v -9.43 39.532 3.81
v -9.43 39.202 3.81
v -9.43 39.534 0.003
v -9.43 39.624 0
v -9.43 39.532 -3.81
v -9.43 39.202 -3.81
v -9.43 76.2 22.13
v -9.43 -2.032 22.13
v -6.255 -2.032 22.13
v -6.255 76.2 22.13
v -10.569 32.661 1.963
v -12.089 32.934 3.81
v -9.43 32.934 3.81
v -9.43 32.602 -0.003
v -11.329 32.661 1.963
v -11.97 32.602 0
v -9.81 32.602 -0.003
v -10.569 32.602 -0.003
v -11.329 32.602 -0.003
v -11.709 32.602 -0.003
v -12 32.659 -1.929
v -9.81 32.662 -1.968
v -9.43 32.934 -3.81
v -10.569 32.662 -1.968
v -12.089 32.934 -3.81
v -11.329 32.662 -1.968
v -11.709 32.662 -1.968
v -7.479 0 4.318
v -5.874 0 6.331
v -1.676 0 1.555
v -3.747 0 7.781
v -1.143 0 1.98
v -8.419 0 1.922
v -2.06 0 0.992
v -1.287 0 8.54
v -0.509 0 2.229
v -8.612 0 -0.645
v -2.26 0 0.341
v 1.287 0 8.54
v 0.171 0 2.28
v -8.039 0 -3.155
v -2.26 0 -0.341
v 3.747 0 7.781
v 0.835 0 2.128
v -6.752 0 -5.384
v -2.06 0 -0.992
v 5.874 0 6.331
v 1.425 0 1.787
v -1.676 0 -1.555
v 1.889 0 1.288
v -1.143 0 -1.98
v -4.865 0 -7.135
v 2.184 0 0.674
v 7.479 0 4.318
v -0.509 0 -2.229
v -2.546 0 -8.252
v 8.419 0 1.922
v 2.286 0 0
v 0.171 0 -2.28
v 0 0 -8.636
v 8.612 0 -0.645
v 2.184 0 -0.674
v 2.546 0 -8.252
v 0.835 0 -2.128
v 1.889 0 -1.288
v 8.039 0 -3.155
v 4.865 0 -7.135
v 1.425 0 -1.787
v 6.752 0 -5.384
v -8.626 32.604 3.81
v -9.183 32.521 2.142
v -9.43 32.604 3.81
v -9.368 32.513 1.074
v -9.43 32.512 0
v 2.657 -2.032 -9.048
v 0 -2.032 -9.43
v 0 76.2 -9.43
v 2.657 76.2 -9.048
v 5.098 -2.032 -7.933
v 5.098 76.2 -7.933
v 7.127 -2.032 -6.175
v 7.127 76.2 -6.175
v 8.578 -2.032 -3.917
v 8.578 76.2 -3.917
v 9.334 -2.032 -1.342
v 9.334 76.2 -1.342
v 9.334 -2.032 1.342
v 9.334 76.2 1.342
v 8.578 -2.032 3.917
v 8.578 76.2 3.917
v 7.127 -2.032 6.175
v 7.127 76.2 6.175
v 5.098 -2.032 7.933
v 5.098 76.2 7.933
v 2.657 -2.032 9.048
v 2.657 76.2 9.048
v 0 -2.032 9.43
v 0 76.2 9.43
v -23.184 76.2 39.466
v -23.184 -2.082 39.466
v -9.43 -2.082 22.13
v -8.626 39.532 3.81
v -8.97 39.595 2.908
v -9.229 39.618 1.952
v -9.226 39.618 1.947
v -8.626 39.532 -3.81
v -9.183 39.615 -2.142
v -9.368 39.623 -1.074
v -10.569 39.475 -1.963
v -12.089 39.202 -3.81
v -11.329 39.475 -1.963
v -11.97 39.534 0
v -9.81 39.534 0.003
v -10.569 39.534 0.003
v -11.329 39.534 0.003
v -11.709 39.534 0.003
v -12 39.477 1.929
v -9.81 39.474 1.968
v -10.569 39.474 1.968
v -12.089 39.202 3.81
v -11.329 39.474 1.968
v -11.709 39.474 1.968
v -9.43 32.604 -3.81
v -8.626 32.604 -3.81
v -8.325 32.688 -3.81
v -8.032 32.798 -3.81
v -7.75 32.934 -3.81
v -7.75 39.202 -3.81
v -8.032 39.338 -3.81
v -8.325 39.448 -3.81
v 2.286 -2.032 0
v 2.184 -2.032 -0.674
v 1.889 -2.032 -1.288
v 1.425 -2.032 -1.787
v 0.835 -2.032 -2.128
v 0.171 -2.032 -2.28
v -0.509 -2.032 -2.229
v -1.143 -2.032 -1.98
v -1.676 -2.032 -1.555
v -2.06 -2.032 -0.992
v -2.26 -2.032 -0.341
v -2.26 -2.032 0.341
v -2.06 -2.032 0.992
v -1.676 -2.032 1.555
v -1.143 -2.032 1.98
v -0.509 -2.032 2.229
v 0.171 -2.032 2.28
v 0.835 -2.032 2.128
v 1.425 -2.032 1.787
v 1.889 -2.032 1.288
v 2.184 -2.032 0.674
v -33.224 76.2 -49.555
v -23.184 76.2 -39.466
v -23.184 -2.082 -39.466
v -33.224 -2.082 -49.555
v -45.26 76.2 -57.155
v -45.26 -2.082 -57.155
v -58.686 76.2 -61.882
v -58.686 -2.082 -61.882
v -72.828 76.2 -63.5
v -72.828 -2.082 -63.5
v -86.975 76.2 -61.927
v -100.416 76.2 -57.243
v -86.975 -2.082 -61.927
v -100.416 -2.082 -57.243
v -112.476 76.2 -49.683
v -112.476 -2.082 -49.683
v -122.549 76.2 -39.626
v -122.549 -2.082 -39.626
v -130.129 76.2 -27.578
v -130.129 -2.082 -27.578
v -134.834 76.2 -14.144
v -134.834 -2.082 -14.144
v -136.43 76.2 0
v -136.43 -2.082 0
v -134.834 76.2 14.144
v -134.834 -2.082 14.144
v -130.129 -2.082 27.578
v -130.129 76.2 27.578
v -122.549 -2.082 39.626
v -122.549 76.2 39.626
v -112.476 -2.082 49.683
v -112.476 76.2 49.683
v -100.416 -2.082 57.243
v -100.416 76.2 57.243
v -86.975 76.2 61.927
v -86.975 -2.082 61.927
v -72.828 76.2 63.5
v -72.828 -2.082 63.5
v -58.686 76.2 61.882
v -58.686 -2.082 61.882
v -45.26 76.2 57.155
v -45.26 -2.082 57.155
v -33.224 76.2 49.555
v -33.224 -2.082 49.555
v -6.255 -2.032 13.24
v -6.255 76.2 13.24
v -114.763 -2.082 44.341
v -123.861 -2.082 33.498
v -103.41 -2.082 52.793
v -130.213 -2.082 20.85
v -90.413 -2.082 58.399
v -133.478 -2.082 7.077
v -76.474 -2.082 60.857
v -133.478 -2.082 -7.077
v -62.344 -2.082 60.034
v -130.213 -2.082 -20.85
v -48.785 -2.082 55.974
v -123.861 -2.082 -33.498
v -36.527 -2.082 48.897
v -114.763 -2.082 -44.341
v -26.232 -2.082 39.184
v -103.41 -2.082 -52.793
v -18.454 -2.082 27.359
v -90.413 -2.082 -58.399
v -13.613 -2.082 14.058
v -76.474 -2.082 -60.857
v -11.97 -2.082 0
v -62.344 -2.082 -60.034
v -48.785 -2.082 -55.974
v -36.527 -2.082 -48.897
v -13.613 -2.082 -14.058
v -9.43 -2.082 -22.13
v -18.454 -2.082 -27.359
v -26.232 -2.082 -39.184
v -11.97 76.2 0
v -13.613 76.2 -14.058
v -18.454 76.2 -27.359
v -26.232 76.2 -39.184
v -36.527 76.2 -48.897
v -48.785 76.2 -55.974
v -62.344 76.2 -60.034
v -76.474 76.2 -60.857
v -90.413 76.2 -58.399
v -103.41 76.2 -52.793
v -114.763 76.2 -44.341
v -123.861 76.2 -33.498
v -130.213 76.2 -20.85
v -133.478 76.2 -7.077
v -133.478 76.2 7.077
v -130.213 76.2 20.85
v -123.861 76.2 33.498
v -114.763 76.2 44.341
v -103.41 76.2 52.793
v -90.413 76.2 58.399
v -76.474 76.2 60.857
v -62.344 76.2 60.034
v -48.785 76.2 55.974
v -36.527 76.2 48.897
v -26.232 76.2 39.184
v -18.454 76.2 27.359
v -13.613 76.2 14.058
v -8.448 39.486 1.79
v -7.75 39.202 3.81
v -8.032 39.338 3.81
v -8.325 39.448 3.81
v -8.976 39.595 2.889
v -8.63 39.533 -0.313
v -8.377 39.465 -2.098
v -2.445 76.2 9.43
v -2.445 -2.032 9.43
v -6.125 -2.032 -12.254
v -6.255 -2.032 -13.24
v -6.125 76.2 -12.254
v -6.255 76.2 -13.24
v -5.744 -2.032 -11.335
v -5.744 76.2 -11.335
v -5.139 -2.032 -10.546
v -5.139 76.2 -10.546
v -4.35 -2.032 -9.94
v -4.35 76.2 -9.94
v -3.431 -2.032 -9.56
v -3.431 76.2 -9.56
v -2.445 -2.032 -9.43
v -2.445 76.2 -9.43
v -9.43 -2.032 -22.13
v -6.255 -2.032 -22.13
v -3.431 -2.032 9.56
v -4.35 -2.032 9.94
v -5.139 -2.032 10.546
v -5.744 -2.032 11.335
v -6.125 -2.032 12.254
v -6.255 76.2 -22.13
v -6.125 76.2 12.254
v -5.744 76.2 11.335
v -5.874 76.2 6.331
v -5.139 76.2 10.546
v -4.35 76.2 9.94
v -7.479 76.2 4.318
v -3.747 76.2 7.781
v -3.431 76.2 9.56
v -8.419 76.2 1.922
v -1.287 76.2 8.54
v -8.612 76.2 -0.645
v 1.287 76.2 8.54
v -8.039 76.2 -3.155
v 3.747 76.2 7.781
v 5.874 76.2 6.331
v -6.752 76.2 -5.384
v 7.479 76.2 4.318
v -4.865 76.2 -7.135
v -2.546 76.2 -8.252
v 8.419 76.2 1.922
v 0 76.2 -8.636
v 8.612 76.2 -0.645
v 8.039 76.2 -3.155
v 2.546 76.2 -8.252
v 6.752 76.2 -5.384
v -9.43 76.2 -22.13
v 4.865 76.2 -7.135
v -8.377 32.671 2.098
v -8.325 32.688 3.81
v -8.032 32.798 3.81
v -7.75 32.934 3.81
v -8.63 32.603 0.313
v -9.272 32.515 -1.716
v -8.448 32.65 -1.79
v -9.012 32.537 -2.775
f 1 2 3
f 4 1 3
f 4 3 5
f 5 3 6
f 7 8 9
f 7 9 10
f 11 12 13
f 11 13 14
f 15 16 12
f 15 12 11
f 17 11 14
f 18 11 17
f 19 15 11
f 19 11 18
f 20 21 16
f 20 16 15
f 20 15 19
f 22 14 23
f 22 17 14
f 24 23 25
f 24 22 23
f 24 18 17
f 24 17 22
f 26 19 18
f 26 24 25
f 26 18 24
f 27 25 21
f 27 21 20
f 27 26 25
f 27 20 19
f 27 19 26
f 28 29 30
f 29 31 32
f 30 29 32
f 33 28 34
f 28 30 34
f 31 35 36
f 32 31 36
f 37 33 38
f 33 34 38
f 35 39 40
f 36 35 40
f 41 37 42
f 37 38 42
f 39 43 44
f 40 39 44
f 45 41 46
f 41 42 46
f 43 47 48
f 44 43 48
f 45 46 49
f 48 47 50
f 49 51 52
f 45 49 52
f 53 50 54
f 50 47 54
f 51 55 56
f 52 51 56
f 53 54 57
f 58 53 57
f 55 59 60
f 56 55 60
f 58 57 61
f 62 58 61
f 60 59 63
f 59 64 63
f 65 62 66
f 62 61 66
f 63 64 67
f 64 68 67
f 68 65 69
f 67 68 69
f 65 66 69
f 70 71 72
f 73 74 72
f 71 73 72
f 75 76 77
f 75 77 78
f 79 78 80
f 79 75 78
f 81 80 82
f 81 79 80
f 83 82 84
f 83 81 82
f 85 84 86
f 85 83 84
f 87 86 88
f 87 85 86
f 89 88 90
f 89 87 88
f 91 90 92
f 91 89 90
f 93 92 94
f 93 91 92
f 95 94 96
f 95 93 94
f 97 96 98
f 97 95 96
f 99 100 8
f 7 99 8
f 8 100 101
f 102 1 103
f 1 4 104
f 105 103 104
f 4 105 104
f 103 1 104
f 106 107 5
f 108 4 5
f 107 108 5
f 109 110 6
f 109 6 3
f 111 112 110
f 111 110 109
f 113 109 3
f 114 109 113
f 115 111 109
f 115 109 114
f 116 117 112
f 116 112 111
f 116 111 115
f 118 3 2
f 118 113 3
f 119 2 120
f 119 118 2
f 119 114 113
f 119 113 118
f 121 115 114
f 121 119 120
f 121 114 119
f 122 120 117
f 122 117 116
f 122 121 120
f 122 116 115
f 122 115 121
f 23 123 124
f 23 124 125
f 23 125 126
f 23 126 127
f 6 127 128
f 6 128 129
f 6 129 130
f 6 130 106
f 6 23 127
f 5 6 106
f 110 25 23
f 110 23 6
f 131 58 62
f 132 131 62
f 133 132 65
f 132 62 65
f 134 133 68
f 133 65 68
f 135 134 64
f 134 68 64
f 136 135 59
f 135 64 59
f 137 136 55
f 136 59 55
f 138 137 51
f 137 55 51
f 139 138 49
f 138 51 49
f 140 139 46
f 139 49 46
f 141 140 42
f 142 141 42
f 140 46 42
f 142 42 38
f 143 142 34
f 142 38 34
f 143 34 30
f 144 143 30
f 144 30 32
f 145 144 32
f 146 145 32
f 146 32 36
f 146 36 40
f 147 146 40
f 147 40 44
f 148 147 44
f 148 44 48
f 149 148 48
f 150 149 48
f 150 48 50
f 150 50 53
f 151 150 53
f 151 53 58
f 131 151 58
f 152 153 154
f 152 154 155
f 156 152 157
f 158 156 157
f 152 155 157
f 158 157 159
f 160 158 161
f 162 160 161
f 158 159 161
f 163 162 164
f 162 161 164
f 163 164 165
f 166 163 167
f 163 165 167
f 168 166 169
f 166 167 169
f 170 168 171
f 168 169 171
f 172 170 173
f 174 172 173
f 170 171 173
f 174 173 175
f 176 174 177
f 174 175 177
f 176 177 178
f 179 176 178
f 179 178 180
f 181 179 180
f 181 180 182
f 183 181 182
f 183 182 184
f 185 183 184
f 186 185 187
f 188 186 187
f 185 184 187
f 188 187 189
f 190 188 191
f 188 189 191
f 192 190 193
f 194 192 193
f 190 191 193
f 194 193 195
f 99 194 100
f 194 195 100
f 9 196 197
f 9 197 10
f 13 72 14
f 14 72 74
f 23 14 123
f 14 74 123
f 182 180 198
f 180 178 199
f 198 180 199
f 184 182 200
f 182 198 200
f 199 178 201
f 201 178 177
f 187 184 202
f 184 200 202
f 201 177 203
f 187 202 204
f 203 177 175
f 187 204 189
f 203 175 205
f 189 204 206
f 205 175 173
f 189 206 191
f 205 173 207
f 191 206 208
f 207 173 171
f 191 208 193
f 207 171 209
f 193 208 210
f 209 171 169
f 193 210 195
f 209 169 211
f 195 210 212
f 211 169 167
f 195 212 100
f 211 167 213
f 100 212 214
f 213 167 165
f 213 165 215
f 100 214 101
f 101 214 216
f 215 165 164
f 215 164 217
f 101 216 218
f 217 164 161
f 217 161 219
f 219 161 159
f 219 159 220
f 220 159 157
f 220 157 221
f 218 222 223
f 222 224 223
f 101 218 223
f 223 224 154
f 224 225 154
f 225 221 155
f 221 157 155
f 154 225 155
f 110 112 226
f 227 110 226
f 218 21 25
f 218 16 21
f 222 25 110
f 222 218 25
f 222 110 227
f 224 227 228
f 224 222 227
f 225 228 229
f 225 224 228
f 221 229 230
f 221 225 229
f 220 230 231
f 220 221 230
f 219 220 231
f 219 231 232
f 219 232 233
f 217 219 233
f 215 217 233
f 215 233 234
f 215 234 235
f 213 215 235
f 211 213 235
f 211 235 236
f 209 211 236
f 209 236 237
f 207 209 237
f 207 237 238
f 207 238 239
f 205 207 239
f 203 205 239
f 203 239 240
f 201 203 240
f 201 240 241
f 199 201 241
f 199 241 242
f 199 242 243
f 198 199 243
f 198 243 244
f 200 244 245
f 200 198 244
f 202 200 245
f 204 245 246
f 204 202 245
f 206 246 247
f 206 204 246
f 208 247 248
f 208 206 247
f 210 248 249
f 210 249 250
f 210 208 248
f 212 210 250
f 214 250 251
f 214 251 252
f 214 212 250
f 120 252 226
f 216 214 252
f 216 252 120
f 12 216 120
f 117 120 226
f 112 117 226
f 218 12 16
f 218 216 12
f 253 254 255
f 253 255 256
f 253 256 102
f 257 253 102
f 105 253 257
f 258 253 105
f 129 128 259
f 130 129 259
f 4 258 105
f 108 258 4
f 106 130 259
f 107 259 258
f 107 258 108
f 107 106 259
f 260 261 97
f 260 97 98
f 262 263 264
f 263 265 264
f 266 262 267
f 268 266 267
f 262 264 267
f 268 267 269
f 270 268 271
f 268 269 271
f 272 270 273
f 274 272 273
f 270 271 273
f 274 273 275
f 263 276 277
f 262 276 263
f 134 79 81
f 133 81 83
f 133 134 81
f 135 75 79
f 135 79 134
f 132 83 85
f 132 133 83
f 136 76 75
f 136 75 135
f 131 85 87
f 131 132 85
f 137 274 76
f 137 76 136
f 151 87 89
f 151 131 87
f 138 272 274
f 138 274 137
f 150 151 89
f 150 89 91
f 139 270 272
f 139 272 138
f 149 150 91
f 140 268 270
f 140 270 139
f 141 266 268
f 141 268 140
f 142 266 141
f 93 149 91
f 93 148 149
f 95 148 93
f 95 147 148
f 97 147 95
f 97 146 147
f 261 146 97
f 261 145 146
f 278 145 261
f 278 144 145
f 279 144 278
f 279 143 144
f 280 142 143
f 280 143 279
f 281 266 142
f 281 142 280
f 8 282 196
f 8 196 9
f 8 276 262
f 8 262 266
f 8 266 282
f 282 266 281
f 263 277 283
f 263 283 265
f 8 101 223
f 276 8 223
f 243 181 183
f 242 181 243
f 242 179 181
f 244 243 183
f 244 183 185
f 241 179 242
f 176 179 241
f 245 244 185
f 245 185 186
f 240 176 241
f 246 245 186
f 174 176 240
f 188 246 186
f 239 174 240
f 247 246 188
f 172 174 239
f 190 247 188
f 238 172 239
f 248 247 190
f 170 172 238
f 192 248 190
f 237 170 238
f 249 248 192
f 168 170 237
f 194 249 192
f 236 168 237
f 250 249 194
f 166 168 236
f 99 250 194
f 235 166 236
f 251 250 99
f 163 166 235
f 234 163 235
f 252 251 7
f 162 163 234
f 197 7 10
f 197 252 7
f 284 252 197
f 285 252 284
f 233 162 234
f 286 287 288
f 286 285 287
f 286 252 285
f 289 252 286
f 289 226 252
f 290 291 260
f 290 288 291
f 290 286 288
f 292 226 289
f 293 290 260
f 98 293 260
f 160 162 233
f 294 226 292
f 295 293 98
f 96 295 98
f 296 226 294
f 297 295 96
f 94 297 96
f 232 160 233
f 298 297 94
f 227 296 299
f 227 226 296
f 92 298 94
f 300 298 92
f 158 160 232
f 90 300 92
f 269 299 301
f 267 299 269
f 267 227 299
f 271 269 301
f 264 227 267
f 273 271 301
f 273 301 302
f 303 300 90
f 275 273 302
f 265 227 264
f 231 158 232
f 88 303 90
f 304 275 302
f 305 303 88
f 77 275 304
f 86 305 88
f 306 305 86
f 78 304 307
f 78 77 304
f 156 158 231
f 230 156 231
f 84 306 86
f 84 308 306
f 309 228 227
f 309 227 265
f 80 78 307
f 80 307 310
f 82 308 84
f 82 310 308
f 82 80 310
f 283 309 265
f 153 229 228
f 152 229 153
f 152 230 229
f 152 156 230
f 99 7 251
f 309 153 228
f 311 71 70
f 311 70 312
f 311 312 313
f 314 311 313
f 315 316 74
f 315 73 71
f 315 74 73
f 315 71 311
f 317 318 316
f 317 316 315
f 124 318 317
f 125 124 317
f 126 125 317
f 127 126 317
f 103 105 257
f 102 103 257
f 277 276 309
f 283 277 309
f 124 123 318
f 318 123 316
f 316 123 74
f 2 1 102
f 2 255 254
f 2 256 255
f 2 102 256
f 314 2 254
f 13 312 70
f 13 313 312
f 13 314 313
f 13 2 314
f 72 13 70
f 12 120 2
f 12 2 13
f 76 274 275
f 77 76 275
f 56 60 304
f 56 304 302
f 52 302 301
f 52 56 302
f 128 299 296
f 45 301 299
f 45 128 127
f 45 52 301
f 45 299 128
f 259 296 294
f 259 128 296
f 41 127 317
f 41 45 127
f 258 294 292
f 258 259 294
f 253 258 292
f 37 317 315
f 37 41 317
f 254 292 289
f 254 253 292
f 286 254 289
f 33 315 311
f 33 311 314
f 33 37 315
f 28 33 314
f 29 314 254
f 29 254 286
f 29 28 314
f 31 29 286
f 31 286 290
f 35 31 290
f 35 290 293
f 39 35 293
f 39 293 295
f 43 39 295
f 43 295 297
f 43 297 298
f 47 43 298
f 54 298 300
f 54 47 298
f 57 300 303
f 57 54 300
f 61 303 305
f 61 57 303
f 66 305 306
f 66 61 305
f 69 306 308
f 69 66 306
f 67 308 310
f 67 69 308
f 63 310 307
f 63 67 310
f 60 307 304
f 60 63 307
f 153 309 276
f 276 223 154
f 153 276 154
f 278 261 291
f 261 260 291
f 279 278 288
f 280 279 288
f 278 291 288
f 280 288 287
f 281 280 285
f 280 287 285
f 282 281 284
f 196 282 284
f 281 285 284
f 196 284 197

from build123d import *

# Parameters (mm, degrees)
SKETCH1_R                        = 9.42975
SKETCH1_R_2                      = 8.636
BOSS_EXTRUDE1_DEPTH              = 76.2
BOSS_EXTRUDE2_START              = 2.032
SKETCH2_R                        = 9.42975
BOSS_EXTRUDE2_DEPTH              = 2.032
F_10_0_1935_DIAMETER_HOLE1_D     = 4.572
F_10_0_1935_DIAMETER_HOLE1_DEPTH = 6.35
F_10_0_1935_DIAMETER_HOLE1_TIP   = 1.373567375
CUT_EXTRUDE1_DEPTH               = 3.81
CUT_EXTRUDE1_DEPTH_BACK          = 3.81
BOSS_EXTRUDE7_REACH              = 81.064
SKETCH7_W                        = 18.8595
SKETCH7_H                        = 78.232
SKETCH7_10_W                     = 12.7
SKETCH7_10_H                     = 78.232
BOSS_EXTRUDE8_DEPTH              = 3.175
FILLET1_R                        = 3.81
BOSS_EXTRUDE9_START              = -78.282
BOSS_EXTRUDE9_OUTLINE_R          = 60.96
BOSS_EXTRUDE9_DEPTH              = 78.282
CUT_EXTRUDE5_START               = -12.0889291
CUT_EXTRUDE5_DEPTH               = 2.6591791


# Read off the part's stored shape, not the designer's step: Boss-Extrude9, Cut-Extrude5
with BuildPart() as part:
    # Sketch1 → Boss-Extrude1 (new body)
    with BuildSketch(Plane(origin=(0, 0, 0), x_dir=(1, 0, 0), z_dir=(0, 1, 0))):
        with Locations(Location((0, 0, 0), (0, 0, 90))):
            Circle(SKETCH1_R)
        with Locations(Location((0, 0, 0), (0, 0, 90))):
            Circle(SKETCH1_R_2, mode=Mode.SUBTRACT)
    extrude(amount=BOSS_EXTRUDE1_DEPTH)

    # Sketch2 → Boss-Extrude2 (add)
    with BuildSketch(Plane.XZ.offset(BOSS_EXTRUDE2_START)):
        with Locations(Location((0, 0, 0), (0, 0, 270))):
            Circle(SKETCH2_R)
    extrude(amount=-BOSS_EXTRUDE2_DEPTH)

    # #10 (0.1935) Diameter Hole1
    with Locations(Plane(origin=(0, -2.032, 0), x_dir=(-1, 0, 0), z_dir=(0, -1, 0))):
        with Locations((0, 0)):
            Hole(F_10_0_1935_DIAMETER_HOLE1_D / 2, depth=F_10_0_1935_DIAMETER_HOLE1_DEPTH)
            with Locations((0, 0, -(F_10_0_1935_DIAMETER_HOLE1_DEPTH + F_10_0_1935_DIAMETER_HOLE1_TIP / 2))):  # 118° drill point
                Cone(0, F_10_0_1935_DIAMETER_HOLE1_D / 2, F_10_0_1935_DIAMETER_HOLE1_TIP, mode=Mode.SUBTRACT)

    # Sketch6 → Cut-Extrude1 (cut, two sides: drawn at the far end of the back side and taken through both)
    with BuildSketch(Plane.XY.offset(-CUT_EXTRUDE1_DEPTH_BACK)):
        with BuildLine():
            ThreePointArc((-9.42975, 32.512), (-5.87375, 36.068), (-9.42975, 39.624))
            Line((-9.42975, 39.624), (-9.42975, 32.512))
        make_face()
    extrude(amount=CUT_EXTRUDE1_DEPTH + CUT_EXTRUDE1_DEPTH_BACK, mode=Mode.SUBTRACT)

    # Sketch7 → Boss-Extrude7 (add, up to next)
    with BuildSketch(Plane.ZY.offset(9.42975), mode=Mode.PRIVATE) as boss_extrude7_sk1:
        with Locations((0, 37.084)):
            Rectangle(SKETCH7_W, SKETCH7_H)
        with BuildLine():
            add(Edge.make_bspline(
                [(3.81, 39.531923881), (3.209063744, 39.593530356), (2.589122456, 39.610377565), (1.314223657, 39.625889154), (0.653564006, 39.624), (-0.649234164, 39.624), (-1.296863086, 39.625963258), (-2.58430554, 39.610570946), (-3.209529815, 39.593482575), (-3.81, 39.531923881)],
                knots=[0, 0, 0, 0, 0.25, 0.25, 0.5, 0.5, 0.75, 0.75, 1, 1, 1, 1], degree=3))
            Line((3.81, 39.531923881), (3.81, 32.604076119))
            add(Edge.make_bspline(
                [(-3.81, 32.604076119), (-3.209063744, 32.542469644), (-2.589122456, 32.525622435), (-1.314223657, 32.510110846), (-0.653564006, 32.512), (0.649234164, 32.512), (1.296863086, 32.510036742), (2.58430554, 32.525429054), (3.209529815, 32.542517425), (3.81, 32.604076119)],
                knots=[0, 0, 0, 0, 0.25, 0.25, 0.5, 0.5, 0.75, 0.75, 1, 1, 1, 1], degree=3))
            Line((-3.81, 32.604076119), (-3.81, 39.531923881))
        make_face(mode=Mode.SUBTRACT)
    boss_extrude7_tool1 = extrude(boss_extrude7_sk1.sketch, amount=-BOSS_EXTRUDE7_REACH, mode=Mode.PRIVATE) - part.part
    add(boss_extrude7_tool1.solids().sort_by_distance((-9.42975, -1.227269, 0))[0])
    add(boss_extrude7_tool1.solids().sort_by_distance((-9.42975, -1.227269, 0))[1])

    # Sketch7<10> → Boss-Extrude8 (add)
    with BuildSketch(Plane.ZY.offset(9.42975)):
        with Locations((-15.77975, 37.084)):
            Rectangle(SKETCH7_10_W, SKETCH7_10_H)
        with Locations((15.77975, 37.084)):
            Rectangle(SKETCH7_10_W, SKETCH7_10_H)
    extrude(amount=-BOSS_EXTRUDE8_DEPTH)

    # Fillet1
    fillet1_edges = [part.edges().sort_by_distance(p)[0] for p in [
        (-6.25475, 37.084, 9.42975),
        (-6.25475, 37.084, -9.42975),
    ]]
    fillet(fillet1_edges, radius=FILLET1_R)

    # Boss-Extrude9 outline → Boss-Extrude9 (add)
    with BuildSketch(Plane(origin=(0, 76.2, 0), x_dir=(1, 0, 0), z_dir=(0, 1, 0)).offset(BOSS_EXTRUDE9_START)):
        with BuildLine():
            Line((-23.183733507, -39.466236748), (-9.42975, -22.12975))
            Line((-9.42975, -22.12975), (-9.42975, 22.12975))
            Line((-9.42975, 22.12975), (-23.183733507, 39.466236748))
            ThreePointArc((-23.183733507, 39.466236748), (-136.42975, 0), (-23.183733507, -39.466236748))
        make_face()
        with Locations((-72.92975, 0)):
            Circle(BOSS_EXTRUDE9_OUTLINE_R, mode=Mode.SUBTRACT)
    extrude(amount=BOSS_EXTRUDE9_DEPTH)

    # Cut-Extrude5 outline → Cut-Extrude5 (cut)
    with BuildSketch(Plane(origin=(0, 0, 0), x_dir=(0, 0, -1), z_dir=(1, 0, 0)).offset(CUT_EXTRUDE5_START)):
        with BuildLine():
            Line((3.81, 32.933676012), (3.81, 39.202323988))
            add(Edge.make_bspline(
                [(3.81, 39.202323988), (3.518648392, 39.279078334), (3.214598323, 39.335686025), (2.596807012, 39.422172204), (2.282372763, 39.452317221), (1.643247367, 39.496969319), (1.3185544, 39.511420765), (0.659044279, 39.530145261), (0.326972294, 39.534304508), (-0.332604892, 39.534255253), (-0.661519368, 39.5300831), (-1.317571239, 39.51144055), (-1.646658119, 39.496824503), (-2.611094156, 39.429162016), (-3.226748456, 39.355977132), (-3.81, 39.202323988)],
                knots=[0, 0, 0, 0, 0.125, 0.125, 0.25, 0.25, 0.375, 0.375, 0.5, 0.5, 0.625, 0.625, 0.75, 0.75, 1, 1, 1, 1], degree=3))
            Line((-3.81, 39.202323988), (-3.81, 32.933676012))
            add(Edge.make_bspline(
                [(-3.81, 32.933676012), (-3.518648392, 32.856921666), (-3.214598323, 32.800313975), (-2.596807012, 32.713827796), (-2.282372763, 32.683682779), (-1.643247367, 32.639030681), (-1.3185544, 32.624579235), (-0.659044279, 32.605854739), (-0.326972294, 32.601695492), (0.332604892, 32.601744747), (0.661519368, 32.6059169), (1.317571239, 32.62455945), (1.646658119, 32.639175497), (2.611094156, 32.706837984), (3.226748456, 32.780022868), (3.81, 32.933676012)],
                knots=[0, 0, 0, 0, 0.125, 0.125, 0.25, 0.25, 0.375, 0.375, 0.5, 0.5, 0.625, 0.625, 0.75, 0.75, 1, 1, 1, 1], degree=3))
        make_face()
    extrude(amount=CUT_EXTRUDE5_DEPTH, mode=Mode.SUBTRACT)


solid = part.part
